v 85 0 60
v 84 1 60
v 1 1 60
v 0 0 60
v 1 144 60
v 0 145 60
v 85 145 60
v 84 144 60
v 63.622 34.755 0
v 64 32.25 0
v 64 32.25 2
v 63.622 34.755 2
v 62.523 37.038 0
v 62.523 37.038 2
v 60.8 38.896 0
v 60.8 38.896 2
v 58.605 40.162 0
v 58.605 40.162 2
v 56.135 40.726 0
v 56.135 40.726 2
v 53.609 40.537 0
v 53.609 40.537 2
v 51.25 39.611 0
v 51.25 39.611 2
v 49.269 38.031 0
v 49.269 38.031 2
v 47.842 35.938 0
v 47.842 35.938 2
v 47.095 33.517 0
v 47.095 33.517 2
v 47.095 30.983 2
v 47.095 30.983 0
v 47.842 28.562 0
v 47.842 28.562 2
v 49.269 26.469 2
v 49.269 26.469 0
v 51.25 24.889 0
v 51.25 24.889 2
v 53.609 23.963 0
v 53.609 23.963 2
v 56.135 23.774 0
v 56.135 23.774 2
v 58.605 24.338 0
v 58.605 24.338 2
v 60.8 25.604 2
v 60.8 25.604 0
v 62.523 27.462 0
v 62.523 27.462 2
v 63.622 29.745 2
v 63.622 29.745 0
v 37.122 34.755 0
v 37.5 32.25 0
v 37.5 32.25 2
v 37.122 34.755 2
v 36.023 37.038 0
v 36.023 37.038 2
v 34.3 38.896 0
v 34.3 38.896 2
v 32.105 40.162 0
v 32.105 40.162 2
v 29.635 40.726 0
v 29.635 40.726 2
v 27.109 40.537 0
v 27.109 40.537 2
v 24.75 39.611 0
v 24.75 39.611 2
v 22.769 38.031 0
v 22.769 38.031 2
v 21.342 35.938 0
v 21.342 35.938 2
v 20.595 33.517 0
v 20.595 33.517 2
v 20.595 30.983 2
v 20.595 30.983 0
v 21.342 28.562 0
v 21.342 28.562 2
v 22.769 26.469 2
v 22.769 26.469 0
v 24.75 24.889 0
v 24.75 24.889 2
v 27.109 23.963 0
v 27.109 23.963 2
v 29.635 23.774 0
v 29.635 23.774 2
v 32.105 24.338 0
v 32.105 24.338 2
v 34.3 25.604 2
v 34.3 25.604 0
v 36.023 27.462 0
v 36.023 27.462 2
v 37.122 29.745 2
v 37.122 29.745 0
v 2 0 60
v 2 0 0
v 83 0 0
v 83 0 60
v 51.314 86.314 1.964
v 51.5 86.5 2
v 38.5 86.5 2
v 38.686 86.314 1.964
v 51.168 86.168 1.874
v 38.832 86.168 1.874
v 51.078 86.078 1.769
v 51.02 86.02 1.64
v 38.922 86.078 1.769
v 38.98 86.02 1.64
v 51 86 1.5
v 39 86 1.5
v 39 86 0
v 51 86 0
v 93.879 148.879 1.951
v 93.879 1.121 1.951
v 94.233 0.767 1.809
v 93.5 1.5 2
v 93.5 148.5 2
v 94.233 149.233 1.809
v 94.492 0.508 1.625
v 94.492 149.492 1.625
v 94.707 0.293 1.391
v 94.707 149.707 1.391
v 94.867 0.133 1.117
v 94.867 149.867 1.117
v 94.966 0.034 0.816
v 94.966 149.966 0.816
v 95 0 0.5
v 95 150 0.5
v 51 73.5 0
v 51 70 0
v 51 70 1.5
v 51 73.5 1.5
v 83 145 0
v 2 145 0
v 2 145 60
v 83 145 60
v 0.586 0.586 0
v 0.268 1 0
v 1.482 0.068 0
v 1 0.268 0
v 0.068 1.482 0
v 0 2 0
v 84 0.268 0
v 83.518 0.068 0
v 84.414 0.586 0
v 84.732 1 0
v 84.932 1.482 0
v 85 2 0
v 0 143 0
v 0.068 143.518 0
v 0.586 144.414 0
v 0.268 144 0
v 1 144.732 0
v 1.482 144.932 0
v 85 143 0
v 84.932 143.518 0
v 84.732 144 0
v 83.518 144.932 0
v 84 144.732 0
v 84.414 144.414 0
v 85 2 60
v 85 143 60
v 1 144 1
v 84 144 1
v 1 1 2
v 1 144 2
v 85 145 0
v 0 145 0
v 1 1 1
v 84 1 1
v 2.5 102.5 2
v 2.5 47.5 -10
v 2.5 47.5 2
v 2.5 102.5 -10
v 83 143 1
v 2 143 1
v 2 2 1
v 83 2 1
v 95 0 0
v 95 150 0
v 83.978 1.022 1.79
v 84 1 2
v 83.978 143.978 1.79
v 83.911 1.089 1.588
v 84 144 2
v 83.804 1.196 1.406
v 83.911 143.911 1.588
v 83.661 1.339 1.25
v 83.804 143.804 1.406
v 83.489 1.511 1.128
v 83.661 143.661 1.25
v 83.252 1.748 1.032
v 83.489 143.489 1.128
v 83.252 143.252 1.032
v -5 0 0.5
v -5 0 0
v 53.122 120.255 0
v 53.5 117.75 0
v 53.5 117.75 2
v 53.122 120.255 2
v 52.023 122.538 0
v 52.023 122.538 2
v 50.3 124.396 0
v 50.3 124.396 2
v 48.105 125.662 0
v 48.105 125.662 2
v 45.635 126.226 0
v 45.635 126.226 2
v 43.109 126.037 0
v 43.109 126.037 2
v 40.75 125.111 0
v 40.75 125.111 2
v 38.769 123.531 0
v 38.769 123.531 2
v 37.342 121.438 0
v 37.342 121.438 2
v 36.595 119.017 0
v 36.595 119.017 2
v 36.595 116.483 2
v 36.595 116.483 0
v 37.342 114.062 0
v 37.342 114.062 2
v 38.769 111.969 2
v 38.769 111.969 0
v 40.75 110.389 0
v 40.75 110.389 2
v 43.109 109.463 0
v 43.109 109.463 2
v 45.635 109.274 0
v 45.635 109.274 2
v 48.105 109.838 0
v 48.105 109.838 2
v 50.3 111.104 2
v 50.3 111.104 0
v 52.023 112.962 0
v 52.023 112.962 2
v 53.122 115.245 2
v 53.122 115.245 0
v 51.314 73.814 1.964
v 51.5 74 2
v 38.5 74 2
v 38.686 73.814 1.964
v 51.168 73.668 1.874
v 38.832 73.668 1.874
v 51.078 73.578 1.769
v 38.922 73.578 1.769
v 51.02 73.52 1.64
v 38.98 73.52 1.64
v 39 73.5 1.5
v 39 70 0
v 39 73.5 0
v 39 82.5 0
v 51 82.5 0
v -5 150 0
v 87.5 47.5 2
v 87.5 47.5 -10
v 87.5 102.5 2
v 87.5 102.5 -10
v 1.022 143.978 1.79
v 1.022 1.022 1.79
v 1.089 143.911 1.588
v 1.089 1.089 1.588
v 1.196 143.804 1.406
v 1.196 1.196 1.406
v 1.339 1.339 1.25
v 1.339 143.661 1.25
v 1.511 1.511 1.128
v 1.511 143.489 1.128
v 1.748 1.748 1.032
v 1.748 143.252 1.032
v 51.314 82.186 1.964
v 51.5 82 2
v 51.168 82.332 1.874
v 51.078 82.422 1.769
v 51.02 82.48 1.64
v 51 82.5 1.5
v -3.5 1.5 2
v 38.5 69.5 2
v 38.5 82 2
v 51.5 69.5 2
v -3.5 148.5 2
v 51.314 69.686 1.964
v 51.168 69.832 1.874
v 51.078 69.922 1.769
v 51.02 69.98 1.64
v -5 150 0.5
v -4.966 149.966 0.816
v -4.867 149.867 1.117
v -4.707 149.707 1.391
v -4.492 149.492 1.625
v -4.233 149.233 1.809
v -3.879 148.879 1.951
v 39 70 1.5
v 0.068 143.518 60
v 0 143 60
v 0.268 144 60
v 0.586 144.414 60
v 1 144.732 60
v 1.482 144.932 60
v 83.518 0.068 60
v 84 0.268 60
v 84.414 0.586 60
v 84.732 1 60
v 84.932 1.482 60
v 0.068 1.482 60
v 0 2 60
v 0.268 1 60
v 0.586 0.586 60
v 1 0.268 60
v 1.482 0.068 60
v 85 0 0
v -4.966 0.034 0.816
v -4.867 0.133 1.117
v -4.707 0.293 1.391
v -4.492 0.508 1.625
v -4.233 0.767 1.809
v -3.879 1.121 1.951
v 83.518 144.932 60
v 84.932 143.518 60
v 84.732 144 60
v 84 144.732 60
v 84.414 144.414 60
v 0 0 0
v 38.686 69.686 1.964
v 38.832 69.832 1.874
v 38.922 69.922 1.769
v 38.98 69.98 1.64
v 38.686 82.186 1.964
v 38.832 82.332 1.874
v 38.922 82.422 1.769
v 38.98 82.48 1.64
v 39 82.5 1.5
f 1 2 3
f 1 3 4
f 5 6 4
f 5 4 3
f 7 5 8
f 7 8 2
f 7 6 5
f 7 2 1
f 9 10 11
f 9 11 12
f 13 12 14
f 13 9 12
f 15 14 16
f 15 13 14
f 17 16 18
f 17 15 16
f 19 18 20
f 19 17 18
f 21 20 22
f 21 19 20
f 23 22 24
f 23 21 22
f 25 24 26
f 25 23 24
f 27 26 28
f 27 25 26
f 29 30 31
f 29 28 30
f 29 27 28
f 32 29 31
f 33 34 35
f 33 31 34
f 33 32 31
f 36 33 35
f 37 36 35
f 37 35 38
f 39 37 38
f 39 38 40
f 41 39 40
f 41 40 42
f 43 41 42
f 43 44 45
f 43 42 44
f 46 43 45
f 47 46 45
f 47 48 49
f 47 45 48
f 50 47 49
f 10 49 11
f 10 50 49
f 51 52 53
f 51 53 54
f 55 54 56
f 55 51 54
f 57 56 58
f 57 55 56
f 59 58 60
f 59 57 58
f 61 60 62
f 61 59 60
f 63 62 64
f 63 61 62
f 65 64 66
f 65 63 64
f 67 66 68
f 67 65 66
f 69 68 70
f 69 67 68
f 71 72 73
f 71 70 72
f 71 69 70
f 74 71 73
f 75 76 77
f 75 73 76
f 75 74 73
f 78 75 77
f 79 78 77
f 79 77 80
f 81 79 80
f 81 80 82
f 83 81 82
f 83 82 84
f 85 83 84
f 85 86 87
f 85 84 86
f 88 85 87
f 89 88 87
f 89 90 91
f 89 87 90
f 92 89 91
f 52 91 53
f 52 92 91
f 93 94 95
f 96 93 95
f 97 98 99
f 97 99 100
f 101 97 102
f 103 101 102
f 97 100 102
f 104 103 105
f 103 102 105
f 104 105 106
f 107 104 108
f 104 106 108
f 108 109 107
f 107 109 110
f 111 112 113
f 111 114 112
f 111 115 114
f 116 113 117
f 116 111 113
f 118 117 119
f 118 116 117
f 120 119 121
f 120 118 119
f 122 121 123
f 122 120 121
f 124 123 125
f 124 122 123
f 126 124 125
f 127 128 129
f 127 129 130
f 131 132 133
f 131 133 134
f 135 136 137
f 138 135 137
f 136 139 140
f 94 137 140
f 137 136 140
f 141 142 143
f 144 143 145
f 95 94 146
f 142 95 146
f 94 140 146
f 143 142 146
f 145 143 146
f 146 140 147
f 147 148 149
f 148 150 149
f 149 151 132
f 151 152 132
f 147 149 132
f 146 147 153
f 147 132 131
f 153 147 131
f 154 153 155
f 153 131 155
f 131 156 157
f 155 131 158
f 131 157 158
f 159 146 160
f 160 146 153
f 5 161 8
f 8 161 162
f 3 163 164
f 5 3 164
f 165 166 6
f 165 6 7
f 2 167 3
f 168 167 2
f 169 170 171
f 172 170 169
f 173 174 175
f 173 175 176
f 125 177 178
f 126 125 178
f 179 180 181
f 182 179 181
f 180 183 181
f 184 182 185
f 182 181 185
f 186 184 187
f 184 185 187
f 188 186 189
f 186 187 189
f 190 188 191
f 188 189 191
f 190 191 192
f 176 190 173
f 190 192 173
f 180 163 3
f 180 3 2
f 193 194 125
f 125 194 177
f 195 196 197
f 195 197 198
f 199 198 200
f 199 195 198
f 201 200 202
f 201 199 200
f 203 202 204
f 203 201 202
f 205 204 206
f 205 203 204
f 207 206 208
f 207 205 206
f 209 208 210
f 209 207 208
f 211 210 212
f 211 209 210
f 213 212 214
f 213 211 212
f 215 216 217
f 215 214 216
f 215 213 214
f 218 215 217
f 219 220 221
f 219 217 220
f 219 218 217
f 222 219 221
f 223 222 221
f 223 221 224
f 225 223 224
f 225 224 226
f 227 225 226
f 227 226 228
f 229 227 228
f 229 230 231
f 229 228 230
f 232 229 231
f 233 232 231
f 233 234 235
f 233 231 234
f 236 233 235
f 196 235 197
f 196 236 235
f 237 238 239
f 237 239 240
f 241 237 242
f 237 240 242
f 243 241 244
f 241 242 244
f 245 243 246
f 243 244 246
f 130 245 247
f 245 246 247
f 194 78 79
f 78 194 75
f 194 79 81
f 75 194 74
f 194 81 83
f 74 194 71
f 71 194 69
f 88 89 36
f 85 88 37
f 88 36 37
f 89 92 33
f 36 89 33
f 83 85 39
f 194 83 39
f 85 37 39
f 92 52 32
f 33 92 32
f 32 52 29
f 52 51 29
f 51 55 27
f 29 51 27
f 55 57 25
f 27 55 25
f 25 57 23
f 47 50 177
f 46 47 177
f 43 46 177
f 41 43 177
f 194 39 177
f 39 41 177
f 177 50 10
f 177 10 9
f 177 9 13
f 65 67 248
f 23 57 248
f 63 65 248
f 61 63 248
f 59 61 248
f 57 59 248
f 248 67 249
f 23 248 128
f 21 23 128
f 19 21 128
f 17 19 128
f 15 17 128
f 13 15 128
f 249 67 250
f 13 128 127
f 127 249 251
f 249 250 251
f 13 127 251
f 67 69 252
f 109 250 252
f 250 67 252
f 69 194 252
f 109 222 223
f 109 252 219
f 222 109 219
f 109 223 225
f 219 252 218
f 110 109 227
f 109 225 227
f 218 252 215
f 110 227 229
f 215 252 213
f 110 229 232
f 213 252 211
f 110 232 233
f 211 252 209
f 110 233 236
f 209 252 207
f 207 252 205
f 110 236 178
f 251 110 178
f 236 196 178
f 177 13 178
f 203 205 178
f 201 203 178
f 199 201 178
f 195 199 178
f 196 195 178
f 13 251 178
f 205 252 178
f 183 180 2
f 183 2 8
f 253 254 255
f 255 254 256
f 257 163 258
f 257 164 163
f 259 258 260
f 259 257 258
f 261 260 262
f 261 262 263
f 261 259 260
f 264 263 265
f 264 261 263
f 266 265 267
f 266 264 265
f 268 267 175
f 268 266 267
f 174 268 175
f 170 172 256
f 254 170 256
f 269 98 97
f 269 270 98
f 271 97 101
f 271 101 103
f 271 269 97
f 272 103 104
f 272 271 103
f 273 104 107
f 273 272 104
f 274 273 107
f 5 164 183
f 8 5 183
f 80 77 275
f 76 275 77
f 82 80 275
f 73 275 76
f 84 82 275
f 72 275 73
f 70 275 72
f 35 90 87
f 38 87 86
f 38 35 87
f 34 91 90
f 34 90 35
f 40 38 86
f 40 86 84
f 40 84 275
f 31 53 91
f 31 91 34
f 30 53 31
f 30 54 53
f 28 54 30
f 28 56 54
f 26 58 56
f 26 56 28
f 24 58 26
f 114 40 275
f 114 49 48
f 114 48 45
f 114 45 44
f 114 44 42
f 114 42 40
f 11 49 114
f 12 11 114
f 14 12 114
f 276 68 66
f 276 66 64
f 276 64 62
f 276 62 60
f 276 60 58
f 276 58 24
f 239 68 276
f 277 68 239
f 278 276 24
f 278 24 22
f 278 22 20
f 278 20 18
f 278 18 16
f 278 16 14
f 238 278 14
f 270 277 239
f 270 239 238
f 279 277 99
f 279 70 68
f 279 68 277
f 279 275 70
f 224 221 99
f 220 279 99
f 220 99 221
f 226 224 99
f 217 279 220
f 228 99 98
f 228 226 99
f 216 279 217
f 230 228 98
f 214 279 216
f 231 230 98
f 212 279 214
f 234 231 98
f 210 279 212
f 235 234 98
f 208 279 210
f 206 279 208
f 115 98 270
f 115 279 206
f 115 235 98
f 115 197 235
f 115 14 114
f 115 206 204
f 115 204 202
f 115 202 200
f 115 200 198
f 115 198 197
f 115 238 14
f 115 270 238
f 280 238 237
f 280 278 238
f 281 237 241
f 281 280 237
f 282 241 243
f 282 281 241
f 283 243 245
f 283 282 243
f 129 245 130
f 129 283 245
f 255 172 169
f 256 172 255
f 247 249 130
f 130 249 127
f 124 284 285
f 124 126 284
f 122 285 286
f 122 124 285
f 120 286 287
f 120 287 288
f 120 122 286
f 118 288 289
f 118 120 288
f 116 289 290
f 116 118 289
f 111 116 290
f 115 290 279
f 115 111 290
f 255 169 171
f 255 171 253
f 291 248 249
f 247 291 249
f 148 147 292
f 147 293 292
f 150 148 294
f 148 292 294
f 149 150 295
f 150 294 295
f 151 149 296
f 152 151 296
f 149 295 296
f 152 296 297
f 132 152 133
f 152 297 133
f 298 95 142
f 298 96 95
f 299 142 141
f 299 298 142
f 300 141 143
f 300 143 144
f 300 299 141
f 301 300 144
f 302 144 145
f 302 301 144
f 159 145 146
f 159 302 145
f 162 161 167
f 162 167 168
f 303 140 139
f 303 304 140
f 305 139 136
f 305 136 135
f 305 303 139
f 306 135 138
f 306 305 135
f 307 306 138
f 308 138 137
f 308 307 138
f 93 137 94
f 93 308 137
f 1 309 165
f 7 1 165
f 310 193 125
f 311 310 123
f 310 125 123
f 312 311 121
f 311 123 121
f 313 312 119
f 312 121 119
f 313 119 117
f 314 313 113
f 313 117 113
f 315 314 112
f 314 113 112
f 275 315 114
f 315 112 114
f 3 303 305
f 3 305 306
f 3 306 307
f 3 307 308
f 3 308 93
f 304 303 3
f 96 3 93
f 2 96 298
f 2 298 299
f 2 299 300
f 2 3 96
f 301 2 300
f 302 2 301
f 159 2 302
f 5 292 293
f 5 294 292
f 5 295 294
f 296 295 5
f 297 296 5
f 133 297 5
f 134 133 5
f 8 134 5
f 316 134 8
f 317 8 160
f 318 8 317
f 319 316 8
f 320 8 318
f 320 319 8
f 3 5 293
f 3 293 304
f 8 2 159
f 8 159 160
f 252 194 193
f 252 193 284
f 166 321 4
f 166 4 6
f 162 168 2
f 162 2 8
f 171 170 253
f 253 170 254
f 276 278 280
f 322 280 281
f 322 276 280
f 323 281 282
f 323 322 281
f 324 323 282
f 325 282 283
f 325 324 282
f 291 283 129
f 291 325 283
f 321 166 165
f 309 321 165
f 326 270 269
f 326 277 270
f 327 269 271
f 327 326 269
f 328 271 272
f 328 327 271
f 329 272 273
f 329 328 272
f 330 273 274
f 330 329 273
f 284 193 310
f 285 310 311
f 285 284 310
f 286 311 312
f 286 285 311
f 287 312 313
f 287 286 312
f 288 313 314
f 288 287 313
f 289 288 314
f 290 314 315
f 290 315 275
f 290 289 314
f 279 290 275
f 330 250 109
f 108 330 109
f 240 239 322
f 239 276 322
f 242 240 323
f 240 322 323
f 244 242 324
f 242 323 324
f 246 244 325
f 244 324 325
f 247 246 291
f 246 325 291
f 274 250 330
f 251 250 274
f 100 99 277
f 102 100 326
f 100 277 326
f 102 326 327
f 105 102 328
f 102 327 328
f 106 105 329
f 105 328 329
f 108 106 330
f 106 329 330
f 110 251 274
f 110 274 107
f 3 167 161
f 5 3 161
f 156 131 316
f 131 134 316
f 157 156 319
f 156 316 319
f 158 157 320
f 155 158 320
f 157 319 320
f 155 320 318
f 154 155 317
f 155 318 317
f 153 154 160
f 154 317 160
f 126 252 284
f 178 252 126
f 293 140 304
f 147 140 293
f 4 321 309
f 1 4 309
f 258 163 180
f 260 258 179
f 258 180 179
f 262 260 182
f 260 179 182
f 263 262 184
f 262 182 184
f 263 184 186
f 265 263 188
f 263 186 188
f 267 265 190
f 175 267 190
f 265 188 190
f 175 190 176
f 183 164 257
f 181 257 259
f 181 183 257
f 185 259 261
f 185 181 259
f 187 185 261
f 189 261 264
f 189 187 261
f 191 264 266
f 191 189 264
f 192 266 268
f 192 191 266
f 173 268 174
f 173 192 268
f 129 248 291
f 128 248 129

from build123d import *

# Parameters (mm, degrees)
BOX003_W          = 85
BOX003_H          = 55
BOX003_DEPTH      = 12
CYLINDER001_R     = 8.5
CYLINDER001_DEPTH = 10
CYLINDER002_R     = 8.5
CYLINDER002_DEPTH = 10
BOX001_W          = 12
BOX001_H          = 3.5
BOX001_DEPTH      = 10
BOX002_W          = 12
BOX002_H          = 3.5
BOX002_DEPTH      = 10
CYLINDER_R        = 8.5
CYLINDER_DEPTH    = 10
BOX_W             = 100
BOX_H             = 150
BOX_DEPTH         = 2
FILLET_R          = 1.5
FILLET001_R       = 0.5
BOX005_W          = 83
BOX005_H          = 143
BOX005_DEPTH      = 65
BOX004_W          = 85
BOX004_H          = 145
BOX004_DEPTH      = 60
FILLET002_R       = 1
FILLET003_R       = 2


with BuildPart() as breadboard_layout:
    # Box003 → Box003 (new body)
    with BuildSketch(Plane(origin=(2.5, 47.5, -10), x_dir=(1, 0, 0), z_dir=(0, 0, 1))):
        with Locations((42.5, 27.5)):
            Rectangle(BOX003_W, BOX003_H)
    extrude(amount=BOX003_DEPTH)


with BuildPart() as taladro_salida_y:
    # Cylinder001 → Cylinder001 (new body)
    with BuildSketch(Plane(origin=(45, 117.75, -4), x_dir=(1, 0, 0), z_dir=(0, 0, 1))):
        Circle(CYLINDER001_R)
    extrude(amount=CYLINDER001_DEPTH)


with BuildPart() as taladro_boton_b:
    # Cylinder002 → Cylinder002 (new body)
    with BuildSketch(Plane(origin=(55.5, 32.25, -4), x_dir=(1, 0, 0), z_dir=(0, 0, 1))):
        Circle(CYLINDER002_R)
    extrude(amount=CYLINDER002_DEPTH)


with BuildPart() as cube001:
    # Box001 → Box001 (new body)
    with BuildSketch(Plane(origin=(39, 82.5, 0), x_dir=(1, 0, 0), z_dir=(0, 0, 1))):
        with Locations((6, 1.75)):
            Rectangle(BOX001_W, BOX001_H)
    extrude(amount=BOX001_DEPTH)


with BuildPart() as cube002:
    # Box002 → Box002 (new body)
    with BuildSketch(Plane(origin=(39, 70, 0), x_dir=(1, 0, 0), z_dir=(0, 0, 1))):
        with Locations((6, 1.75)):
            Rectangle(BOX002_W, BOX002_H)
    extrude(amount=BOX002_DEPTH)


with BuildPart() as taladro_boton_a:
    # Cylinder → Cylinder (new body)
    with BuildSketch(Plane(origin=(29, 32.25, -4), x_dir=(1, 0, 0), z_dir=(0, 0, 1))):
        Circle(CYLINDER_R)
    extrude(amount=CYLINDER_DEPTH)


with BuildPart() as fillet001:
    # Box → Box (new body)
    with BuildSketch(Plane(origin=(-5, 0, 0), x_dir=(1, 0, 0), z_dir=(0, 0, 1))):
        with Locations((50, 75)):
            Rectangle(BOX_W, BOX_H)
    extrude(amount=BOX_DEPTH)

    # Cut: cut Taladro boton A
    add(taladro_boton_a.part, mode=Mode.SUBTRACT)

    # Cut001: cut Cube002
    add(cube002.part, mode=Mode.SUBTRACT)

    # Cut002: cut Cube001
    add(cube001.part, mode=Mode.SUBTRACT)

    # Cut003: cut Taladro boton B
    add(taladro_boton_b.part, mode=Mode.SUBTRACT)

    # Cut004: cut Taladro salida Y
    add(taladro_salida_y.part, mode=Mode.SUBTRACT)

    # Fillet
    fillet_edges = [fillet001.edges().sort_by_distance(p)[0] for p in [
        (-5, 75, 2),
        (45, 0, 2),
        (45, 150, 2),
        (95, 75, 2),
    ]]
    fillet(fillet_edges, radius=FILLET_R)

    # Fillet001
    fillet001_edges = [fillet001.edges().sort_by_distance(p)[0] for p in [
        (45, 86, 2),
        (51, 84.25, 2),
        (39, 84.25, 2),
        (45, 82.5, 2),
        (51, 71.75, 2),
        (45, 70, 2),
        (45, 73.5, 2),
        (39, 71.75, 2),
    ]]
    fillet(fillet001_edges, radius=FILLET001_R)


with BuildPart() as cube004:
    # Box005 → Box005 (new body)
    with BuildSketch(Plane(origin=(1, 1, 1), x_dir=(1, 0, 0), z_dir=(0, 0, 1))):
        with Locations((41.5, 71.5)):
            Rectangle(BOX005_W, BOX005_H)
    extrude(amount=BOX005_DEPTH)


with BuildPart() as cut005:
    # Box004 → Box004 (new body)
    with BuildSketch(Plane.XY):
        with Locations((42.5, 72.5)):
            Rectangle(BOX004_W, BOX004_H)
    extrude(amount=BOX004_DEPTH)

    # Cut005: cut Cube004
    add(cube004.part, mode=Mode.SUBTRACT)


with BuildPart() as fillet002:
    # Fillet002 base: copy of Cut005
    add(cut005.part)

    # Fillet002
    fillet002_edges = [fillet002.edges().sort_by_distance(p)[0] for p in [
        (84, 72.5, 1),
        (42.5, 144, 1),
        (1, 72.5, 1),
        (42.5, 1, 1),
    ]]
    fillet(fillet002_edges, radius=FILLET002_R)


with BuildPart() as fillet003:
    # Fillet003 base: copy of Cut005
    add(cut005.part)

    # Fillet003
    fillet003_edges = [fillet003.edges().sort_by_distance(p)[0] for p in [
        (0, 0, 30),
        (0, 145, 30),
        (85, 0, 30),
        (85, 145, 30),
    ]]
    fillet(fillet003_edges, radius=FILLET003_R)


solid = Compound([breadboard_layout.part, fillet001.part, fillet002.part, fillet003.part])
